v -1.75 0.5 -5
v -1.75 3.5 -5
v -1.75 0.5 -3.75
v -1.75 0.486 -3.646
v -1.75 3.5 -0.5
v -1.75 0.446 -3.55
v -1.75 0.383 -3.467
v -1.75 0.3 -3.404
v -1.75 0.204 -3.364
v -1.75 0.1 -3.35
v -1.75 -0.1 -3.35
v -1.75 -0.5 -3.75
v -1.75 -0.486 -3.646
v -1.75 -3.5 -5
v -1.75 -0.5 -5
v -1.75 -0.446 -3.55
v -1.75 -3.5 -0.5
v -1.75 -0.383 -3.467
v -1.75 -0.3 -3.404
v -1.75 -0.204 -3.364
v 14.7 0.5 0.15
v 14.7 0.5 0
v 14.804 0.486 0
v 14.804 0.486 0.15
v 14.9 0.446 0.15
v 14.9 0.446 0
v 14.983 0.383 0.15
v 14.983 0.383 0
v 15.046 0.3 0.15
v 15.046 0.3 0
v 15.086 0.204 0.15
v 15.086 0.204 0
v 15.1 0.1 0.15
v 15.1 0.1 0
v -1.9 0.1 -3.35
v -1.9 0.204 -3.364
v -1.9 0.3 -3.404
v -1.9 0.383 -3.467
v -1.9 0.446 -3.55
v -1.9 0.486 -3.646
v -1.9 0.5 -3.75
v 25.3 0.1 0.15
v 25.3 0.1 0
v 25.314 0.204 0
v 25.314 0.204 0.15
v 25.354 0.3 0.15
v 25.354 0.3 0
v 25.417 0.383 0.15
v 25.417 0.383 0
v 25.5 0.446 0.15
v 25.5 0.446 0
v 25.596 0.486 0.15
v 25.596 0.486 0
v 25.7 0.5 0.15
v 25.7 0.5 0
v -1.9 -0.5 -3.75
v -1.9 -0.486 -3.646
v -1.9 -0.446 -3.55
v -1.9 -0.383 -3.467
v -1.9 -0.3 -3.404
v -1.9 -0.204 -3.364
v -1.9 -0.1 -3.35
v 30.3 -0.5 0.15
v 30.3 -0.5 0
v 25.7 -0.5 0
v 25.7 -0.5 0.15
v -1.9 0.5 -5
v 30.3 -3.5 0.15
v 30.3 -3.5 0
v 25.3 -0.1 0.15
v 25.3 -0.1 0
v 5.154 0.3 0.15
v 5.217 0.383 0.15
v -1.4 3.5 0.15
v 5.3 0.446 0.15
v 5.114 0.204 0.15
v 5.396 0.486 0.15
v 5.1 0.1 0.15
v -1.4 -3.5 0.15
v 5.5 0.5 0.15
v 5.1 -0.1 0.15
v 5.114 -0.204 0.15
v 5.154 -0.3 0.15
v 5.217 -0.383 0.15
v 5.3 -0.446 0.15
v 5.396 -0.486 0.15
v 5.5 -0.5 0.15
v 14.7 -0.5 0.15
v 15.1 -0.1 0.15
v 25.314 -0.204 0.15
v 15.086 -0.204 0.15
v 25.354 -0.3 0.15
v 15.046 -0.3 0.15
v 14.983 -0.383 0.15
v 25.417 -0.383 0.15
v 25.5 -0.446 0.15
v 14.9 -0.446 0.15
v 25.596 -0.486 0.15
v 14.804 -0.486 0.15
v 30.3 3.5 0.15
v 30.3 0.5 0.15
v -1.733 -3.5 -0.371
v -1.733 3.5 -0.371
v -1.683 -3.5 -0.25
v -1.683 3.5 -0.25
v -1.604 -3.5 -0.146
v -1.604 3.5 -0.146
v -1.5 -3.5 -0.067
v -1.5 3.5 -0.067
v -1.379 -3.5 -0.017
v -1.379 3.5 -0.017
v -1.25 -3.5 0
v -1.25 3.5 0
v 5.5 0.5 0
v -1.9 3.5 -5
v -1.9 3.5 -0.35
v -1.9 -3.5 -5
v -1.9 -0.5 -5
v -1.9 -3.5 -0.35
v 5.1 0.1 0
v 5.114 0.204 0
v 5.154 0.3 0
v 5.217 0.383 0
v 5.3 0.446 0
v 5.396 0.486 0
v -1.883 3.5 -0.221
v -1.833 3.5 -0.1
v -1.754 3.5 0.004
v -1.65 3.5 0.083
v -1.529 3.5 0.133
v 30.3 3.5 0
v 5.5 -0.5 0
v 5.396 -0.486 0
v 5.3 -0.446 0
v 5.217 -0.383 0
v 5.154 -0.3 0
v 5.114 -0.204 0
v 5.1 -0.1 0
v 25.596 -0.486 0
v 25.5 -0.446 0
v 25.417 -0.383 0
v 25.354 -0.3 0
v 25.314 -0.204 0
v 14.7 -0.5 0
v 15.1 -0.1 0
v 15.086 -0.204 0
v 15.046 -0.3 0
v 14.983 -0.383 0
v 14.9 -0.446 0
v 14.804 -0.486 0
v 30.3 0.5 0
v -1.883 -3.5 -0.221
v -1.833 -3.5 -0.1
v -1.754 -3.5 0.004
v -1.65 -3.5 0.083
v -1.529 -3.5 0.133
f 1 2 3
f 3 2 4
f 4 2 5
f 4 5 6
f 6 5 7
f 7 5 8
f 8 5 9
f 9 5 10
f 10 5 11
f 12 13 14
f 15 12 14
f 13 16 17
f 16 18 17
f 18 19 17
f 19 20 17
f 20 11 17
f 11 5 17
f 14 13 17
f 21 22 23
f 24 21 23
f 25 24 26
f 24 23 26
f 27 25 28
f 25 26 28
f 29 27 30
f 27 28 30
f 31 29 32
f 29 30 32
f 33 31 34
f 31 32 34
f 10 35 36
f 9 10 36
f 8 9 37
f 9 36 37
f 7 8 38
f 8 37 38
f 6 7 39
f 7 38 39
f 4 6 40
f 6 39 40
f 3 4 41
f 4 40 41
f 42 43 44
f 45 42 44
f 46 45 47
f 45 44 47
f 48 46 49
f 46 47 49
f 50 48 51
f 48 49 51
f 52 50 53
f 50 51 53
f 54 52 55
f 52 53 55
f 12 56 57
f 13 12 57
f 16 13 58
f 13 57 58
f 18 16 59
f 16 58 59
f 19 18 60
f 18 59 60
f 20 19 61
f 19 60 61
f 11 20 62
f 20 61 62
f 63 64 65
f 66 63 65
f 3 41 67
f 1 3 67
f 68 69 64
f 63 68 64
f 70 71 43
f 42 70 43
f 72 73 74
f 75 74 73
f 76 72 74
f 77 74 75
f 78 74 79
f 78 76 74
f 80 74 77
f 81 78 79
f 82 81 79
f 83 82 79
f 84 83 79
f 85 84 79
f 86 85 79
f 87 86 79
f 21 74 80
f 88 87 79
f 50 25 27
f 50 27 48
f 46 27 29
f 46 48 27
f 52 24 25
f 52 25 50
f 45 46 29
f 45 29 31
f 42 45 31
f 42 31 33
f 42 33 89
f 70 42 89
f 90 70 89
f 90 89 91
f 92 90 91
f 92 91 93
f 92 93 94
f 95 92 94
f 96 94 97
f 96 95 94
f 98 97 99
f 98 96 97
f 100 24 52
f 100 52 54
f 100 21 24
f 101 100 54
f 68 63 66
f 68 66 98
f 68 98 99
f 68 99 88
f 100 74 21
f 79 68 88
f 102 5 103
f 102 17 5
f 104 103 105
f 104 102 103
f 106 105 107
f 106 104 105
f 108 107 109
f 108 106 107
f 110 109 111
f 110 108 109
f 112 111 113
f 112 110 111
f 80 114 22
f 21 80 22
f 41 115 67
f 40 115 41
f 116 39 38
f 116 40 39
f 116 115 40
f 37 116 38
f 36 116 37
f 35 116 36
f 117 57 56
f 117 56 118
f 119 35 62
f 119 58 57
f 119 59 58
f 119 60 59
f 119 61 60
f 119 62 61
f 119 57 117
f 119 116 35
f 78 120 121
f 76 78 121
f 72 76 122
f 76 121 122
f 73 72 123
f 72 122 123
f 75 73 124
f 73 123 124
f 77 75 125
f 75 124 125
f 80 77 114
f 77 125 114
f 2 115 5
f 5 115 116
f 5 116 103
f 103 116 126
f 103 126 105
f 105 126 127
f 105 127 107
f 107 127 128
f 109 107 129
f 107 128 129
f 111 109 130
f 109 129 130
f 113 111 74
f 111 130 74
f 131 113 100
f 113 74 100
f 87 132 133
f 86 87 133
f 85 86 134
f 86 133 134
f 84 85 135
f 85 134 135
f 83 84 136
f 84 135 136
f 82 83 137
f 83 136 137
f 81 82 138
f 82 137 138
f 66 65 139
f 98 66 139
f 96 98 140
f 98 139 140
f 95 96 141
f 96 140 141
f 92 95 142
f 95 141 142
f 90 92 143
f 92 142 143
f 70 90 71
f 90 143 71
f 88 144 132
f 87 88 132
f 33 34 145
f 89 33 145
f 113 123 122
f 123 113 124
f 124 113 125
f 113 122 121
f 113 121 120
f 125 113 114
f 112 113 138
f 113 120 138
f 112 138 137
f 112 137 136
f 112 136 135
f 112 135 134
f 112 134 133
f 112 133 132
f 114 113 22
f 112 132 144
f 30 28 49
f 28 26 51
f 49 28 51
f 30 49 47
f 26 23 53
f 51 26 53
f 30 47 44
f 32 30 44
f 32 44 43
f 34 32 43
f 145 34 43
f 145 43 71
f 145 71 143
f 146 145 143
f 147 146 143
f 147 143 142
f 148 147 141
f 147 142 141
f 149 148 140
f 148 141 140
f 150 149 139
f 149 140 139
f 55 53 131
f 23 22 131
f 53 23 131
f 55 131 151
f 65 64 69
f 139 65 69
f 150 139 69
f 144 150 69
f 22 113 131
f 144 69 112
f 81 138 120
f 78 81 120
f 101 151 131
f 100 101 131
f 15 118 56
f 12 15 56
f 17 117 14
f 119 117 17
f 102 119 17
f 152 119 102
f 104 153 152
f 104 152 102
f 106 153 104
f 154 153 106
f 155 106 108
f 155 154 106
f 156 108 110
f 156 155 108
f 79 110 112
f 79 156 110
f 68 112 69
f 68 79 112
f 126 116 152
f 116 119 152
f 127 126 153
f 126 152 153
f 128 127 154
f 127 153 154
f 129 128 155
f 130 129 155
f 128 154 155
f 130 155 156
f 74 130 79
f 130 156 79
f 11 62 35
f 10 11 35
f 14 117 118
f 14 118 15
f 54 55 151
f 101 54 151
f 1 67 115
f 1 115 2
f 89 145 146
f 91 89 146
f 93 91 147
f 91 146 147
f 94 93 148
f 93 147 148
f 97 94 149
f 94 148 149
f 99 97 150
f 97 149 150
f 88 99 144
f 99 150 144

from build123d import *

# Parameters (mm, degrees)
F1_DEPTH = 0.15
F2_DEPTH = 1.9
F3_W     = 0.15
F3_H     = 7
F4_DEPTH = 5
F6_DEPTH = 25
F7_R     = 0.5


# Not quite as in the source:
# - a feature names something its author has since deleted; it is built from what else it names


with BuildPart() as f1:
    # F0 (on Top) → F1 (new body)
    with BuildSketch(Plane.XY):
        with BuildLine():
            Line((10.1, -0.5), (10.1, -3.5))
            Line((10.1, -3.5), (20.2, -3.5))
            Line((20.2, -3.5), (30.3, -3.5))
            Line((30.3, -3.5), (30.3, -0.5))
            Line((30.3, -0.5), (25.7, -0.5))
            ThreePointArc((25.7, -0.5), (25.4171572875, -0.3828427125), (25.3, -0.1))
            Line((25.3, -0.1), (25.3, 0.1))
            ThreePointArc((25.3, 0.1), (25.4171572875, 0.3828427125), (25.7, 0.5))
            Line((25.7, 0.5), (30.3, 0.5))
            Line((30.3, 0.5), (30.3, 3.5))
            Line((30.3, 3.5), (20.2, 3.5))
            Line((20.2, 3.5), (10.1, 3.5))
            Line((10.1, 3.5), (10.1, 0.5))
            Line((10.1, 0.5), (14.7, 0.5))
            ThreePointArc((14.7, 0.5), (14.9828427125, 0.3828427125), (15.1, 0.1))
            Line((15.1, 0.1), (15.1, -0.1))
            ThreePointArc((15.1, -0.1), (14.9828427125, -0.3828427125), (14.7, -0.5))
            Line((14.7, -0.5), (10.1, -0.5))
        make_face()
        with BuildLine():
            Line((0, 3.5), (0, -3.5))
            Line((0, -3.5), (10.1, -3.5))
            Line((10.1, -3.5), (10.1, -0.5))
            Line((10.1, -0.5), (5.5, -0.5))
            ThreePointArc((5.5, -0.5), (5.2171572875, -0.3828427125), (5.1, -0.1))
            Line((5.1, -0.1), (5.1, 0.1))
            ThreePointArc((5.1, 0.1), (5.2171572875, 0.3828427125), (5.5, 0.5))
            Line((5.5, 0.5), (10.1, 0.5))
            Line((10.1, 0.5), (10.1, 3.5))
            Line((10.1, 3.5), (0, 3.5))
        make_face()
    extrude(amount=F1_DEPTH)

    # F2 (add): a face of the model
    f2_faces = [f1.faces().sort_by_distance(p)[0] for p in [
        (0, 0, 0.075),
    ]]
    extrude(f2_faces, amount=F2_DEPTH)

    # F3 (on face) → F4 (join)
    with BuildSketch(Plane(origin=(0, 0, 0), x_dir=(1, 0, 0), z_dir=(0, 0, -1))):
        with Locations((-1.825, 0)):
            Rectangle(F3_W, F3_H)
    extrude(amount=F4_DEPTH)

    # F5 (on face) → F6 (cut)
    with BuildSketch(Plane(origin=(-1.9, 0, 0), x_dir=(0, -1, 0), z_dir=(-1, 0, 0))):
        with BuildLine():
            ThreePointArc((0.5, -3.75), (0.3828427125, -3.4671572875), (0.1, -3.35))
            Line((0.1, -3.35), (-0.1, -3.35))
            ThreePointArc((-0.1, -3.35), (-0.3828427125, -3.4671572875), (-0.5, -3.75))
            Line((-0.5, -3.75), (-0.5, -5))
            Line((-0.5, -5), (0.5, -5))
            Line((0.5, -5), (0.5, -3.75))
        make_face()
    extrude(amount=-F6_DEPTH, mode=Mode.SUBTRACT)

    # F7
    f7_edges = [f1.edges().sort_by_distance(p)[0] for p in [
        (-1.9, 0, 0.15),
        (-1.75, 0, 0),
    ]]
    fillet(f7_edges, radius=F7_R)


solid = f1.part
